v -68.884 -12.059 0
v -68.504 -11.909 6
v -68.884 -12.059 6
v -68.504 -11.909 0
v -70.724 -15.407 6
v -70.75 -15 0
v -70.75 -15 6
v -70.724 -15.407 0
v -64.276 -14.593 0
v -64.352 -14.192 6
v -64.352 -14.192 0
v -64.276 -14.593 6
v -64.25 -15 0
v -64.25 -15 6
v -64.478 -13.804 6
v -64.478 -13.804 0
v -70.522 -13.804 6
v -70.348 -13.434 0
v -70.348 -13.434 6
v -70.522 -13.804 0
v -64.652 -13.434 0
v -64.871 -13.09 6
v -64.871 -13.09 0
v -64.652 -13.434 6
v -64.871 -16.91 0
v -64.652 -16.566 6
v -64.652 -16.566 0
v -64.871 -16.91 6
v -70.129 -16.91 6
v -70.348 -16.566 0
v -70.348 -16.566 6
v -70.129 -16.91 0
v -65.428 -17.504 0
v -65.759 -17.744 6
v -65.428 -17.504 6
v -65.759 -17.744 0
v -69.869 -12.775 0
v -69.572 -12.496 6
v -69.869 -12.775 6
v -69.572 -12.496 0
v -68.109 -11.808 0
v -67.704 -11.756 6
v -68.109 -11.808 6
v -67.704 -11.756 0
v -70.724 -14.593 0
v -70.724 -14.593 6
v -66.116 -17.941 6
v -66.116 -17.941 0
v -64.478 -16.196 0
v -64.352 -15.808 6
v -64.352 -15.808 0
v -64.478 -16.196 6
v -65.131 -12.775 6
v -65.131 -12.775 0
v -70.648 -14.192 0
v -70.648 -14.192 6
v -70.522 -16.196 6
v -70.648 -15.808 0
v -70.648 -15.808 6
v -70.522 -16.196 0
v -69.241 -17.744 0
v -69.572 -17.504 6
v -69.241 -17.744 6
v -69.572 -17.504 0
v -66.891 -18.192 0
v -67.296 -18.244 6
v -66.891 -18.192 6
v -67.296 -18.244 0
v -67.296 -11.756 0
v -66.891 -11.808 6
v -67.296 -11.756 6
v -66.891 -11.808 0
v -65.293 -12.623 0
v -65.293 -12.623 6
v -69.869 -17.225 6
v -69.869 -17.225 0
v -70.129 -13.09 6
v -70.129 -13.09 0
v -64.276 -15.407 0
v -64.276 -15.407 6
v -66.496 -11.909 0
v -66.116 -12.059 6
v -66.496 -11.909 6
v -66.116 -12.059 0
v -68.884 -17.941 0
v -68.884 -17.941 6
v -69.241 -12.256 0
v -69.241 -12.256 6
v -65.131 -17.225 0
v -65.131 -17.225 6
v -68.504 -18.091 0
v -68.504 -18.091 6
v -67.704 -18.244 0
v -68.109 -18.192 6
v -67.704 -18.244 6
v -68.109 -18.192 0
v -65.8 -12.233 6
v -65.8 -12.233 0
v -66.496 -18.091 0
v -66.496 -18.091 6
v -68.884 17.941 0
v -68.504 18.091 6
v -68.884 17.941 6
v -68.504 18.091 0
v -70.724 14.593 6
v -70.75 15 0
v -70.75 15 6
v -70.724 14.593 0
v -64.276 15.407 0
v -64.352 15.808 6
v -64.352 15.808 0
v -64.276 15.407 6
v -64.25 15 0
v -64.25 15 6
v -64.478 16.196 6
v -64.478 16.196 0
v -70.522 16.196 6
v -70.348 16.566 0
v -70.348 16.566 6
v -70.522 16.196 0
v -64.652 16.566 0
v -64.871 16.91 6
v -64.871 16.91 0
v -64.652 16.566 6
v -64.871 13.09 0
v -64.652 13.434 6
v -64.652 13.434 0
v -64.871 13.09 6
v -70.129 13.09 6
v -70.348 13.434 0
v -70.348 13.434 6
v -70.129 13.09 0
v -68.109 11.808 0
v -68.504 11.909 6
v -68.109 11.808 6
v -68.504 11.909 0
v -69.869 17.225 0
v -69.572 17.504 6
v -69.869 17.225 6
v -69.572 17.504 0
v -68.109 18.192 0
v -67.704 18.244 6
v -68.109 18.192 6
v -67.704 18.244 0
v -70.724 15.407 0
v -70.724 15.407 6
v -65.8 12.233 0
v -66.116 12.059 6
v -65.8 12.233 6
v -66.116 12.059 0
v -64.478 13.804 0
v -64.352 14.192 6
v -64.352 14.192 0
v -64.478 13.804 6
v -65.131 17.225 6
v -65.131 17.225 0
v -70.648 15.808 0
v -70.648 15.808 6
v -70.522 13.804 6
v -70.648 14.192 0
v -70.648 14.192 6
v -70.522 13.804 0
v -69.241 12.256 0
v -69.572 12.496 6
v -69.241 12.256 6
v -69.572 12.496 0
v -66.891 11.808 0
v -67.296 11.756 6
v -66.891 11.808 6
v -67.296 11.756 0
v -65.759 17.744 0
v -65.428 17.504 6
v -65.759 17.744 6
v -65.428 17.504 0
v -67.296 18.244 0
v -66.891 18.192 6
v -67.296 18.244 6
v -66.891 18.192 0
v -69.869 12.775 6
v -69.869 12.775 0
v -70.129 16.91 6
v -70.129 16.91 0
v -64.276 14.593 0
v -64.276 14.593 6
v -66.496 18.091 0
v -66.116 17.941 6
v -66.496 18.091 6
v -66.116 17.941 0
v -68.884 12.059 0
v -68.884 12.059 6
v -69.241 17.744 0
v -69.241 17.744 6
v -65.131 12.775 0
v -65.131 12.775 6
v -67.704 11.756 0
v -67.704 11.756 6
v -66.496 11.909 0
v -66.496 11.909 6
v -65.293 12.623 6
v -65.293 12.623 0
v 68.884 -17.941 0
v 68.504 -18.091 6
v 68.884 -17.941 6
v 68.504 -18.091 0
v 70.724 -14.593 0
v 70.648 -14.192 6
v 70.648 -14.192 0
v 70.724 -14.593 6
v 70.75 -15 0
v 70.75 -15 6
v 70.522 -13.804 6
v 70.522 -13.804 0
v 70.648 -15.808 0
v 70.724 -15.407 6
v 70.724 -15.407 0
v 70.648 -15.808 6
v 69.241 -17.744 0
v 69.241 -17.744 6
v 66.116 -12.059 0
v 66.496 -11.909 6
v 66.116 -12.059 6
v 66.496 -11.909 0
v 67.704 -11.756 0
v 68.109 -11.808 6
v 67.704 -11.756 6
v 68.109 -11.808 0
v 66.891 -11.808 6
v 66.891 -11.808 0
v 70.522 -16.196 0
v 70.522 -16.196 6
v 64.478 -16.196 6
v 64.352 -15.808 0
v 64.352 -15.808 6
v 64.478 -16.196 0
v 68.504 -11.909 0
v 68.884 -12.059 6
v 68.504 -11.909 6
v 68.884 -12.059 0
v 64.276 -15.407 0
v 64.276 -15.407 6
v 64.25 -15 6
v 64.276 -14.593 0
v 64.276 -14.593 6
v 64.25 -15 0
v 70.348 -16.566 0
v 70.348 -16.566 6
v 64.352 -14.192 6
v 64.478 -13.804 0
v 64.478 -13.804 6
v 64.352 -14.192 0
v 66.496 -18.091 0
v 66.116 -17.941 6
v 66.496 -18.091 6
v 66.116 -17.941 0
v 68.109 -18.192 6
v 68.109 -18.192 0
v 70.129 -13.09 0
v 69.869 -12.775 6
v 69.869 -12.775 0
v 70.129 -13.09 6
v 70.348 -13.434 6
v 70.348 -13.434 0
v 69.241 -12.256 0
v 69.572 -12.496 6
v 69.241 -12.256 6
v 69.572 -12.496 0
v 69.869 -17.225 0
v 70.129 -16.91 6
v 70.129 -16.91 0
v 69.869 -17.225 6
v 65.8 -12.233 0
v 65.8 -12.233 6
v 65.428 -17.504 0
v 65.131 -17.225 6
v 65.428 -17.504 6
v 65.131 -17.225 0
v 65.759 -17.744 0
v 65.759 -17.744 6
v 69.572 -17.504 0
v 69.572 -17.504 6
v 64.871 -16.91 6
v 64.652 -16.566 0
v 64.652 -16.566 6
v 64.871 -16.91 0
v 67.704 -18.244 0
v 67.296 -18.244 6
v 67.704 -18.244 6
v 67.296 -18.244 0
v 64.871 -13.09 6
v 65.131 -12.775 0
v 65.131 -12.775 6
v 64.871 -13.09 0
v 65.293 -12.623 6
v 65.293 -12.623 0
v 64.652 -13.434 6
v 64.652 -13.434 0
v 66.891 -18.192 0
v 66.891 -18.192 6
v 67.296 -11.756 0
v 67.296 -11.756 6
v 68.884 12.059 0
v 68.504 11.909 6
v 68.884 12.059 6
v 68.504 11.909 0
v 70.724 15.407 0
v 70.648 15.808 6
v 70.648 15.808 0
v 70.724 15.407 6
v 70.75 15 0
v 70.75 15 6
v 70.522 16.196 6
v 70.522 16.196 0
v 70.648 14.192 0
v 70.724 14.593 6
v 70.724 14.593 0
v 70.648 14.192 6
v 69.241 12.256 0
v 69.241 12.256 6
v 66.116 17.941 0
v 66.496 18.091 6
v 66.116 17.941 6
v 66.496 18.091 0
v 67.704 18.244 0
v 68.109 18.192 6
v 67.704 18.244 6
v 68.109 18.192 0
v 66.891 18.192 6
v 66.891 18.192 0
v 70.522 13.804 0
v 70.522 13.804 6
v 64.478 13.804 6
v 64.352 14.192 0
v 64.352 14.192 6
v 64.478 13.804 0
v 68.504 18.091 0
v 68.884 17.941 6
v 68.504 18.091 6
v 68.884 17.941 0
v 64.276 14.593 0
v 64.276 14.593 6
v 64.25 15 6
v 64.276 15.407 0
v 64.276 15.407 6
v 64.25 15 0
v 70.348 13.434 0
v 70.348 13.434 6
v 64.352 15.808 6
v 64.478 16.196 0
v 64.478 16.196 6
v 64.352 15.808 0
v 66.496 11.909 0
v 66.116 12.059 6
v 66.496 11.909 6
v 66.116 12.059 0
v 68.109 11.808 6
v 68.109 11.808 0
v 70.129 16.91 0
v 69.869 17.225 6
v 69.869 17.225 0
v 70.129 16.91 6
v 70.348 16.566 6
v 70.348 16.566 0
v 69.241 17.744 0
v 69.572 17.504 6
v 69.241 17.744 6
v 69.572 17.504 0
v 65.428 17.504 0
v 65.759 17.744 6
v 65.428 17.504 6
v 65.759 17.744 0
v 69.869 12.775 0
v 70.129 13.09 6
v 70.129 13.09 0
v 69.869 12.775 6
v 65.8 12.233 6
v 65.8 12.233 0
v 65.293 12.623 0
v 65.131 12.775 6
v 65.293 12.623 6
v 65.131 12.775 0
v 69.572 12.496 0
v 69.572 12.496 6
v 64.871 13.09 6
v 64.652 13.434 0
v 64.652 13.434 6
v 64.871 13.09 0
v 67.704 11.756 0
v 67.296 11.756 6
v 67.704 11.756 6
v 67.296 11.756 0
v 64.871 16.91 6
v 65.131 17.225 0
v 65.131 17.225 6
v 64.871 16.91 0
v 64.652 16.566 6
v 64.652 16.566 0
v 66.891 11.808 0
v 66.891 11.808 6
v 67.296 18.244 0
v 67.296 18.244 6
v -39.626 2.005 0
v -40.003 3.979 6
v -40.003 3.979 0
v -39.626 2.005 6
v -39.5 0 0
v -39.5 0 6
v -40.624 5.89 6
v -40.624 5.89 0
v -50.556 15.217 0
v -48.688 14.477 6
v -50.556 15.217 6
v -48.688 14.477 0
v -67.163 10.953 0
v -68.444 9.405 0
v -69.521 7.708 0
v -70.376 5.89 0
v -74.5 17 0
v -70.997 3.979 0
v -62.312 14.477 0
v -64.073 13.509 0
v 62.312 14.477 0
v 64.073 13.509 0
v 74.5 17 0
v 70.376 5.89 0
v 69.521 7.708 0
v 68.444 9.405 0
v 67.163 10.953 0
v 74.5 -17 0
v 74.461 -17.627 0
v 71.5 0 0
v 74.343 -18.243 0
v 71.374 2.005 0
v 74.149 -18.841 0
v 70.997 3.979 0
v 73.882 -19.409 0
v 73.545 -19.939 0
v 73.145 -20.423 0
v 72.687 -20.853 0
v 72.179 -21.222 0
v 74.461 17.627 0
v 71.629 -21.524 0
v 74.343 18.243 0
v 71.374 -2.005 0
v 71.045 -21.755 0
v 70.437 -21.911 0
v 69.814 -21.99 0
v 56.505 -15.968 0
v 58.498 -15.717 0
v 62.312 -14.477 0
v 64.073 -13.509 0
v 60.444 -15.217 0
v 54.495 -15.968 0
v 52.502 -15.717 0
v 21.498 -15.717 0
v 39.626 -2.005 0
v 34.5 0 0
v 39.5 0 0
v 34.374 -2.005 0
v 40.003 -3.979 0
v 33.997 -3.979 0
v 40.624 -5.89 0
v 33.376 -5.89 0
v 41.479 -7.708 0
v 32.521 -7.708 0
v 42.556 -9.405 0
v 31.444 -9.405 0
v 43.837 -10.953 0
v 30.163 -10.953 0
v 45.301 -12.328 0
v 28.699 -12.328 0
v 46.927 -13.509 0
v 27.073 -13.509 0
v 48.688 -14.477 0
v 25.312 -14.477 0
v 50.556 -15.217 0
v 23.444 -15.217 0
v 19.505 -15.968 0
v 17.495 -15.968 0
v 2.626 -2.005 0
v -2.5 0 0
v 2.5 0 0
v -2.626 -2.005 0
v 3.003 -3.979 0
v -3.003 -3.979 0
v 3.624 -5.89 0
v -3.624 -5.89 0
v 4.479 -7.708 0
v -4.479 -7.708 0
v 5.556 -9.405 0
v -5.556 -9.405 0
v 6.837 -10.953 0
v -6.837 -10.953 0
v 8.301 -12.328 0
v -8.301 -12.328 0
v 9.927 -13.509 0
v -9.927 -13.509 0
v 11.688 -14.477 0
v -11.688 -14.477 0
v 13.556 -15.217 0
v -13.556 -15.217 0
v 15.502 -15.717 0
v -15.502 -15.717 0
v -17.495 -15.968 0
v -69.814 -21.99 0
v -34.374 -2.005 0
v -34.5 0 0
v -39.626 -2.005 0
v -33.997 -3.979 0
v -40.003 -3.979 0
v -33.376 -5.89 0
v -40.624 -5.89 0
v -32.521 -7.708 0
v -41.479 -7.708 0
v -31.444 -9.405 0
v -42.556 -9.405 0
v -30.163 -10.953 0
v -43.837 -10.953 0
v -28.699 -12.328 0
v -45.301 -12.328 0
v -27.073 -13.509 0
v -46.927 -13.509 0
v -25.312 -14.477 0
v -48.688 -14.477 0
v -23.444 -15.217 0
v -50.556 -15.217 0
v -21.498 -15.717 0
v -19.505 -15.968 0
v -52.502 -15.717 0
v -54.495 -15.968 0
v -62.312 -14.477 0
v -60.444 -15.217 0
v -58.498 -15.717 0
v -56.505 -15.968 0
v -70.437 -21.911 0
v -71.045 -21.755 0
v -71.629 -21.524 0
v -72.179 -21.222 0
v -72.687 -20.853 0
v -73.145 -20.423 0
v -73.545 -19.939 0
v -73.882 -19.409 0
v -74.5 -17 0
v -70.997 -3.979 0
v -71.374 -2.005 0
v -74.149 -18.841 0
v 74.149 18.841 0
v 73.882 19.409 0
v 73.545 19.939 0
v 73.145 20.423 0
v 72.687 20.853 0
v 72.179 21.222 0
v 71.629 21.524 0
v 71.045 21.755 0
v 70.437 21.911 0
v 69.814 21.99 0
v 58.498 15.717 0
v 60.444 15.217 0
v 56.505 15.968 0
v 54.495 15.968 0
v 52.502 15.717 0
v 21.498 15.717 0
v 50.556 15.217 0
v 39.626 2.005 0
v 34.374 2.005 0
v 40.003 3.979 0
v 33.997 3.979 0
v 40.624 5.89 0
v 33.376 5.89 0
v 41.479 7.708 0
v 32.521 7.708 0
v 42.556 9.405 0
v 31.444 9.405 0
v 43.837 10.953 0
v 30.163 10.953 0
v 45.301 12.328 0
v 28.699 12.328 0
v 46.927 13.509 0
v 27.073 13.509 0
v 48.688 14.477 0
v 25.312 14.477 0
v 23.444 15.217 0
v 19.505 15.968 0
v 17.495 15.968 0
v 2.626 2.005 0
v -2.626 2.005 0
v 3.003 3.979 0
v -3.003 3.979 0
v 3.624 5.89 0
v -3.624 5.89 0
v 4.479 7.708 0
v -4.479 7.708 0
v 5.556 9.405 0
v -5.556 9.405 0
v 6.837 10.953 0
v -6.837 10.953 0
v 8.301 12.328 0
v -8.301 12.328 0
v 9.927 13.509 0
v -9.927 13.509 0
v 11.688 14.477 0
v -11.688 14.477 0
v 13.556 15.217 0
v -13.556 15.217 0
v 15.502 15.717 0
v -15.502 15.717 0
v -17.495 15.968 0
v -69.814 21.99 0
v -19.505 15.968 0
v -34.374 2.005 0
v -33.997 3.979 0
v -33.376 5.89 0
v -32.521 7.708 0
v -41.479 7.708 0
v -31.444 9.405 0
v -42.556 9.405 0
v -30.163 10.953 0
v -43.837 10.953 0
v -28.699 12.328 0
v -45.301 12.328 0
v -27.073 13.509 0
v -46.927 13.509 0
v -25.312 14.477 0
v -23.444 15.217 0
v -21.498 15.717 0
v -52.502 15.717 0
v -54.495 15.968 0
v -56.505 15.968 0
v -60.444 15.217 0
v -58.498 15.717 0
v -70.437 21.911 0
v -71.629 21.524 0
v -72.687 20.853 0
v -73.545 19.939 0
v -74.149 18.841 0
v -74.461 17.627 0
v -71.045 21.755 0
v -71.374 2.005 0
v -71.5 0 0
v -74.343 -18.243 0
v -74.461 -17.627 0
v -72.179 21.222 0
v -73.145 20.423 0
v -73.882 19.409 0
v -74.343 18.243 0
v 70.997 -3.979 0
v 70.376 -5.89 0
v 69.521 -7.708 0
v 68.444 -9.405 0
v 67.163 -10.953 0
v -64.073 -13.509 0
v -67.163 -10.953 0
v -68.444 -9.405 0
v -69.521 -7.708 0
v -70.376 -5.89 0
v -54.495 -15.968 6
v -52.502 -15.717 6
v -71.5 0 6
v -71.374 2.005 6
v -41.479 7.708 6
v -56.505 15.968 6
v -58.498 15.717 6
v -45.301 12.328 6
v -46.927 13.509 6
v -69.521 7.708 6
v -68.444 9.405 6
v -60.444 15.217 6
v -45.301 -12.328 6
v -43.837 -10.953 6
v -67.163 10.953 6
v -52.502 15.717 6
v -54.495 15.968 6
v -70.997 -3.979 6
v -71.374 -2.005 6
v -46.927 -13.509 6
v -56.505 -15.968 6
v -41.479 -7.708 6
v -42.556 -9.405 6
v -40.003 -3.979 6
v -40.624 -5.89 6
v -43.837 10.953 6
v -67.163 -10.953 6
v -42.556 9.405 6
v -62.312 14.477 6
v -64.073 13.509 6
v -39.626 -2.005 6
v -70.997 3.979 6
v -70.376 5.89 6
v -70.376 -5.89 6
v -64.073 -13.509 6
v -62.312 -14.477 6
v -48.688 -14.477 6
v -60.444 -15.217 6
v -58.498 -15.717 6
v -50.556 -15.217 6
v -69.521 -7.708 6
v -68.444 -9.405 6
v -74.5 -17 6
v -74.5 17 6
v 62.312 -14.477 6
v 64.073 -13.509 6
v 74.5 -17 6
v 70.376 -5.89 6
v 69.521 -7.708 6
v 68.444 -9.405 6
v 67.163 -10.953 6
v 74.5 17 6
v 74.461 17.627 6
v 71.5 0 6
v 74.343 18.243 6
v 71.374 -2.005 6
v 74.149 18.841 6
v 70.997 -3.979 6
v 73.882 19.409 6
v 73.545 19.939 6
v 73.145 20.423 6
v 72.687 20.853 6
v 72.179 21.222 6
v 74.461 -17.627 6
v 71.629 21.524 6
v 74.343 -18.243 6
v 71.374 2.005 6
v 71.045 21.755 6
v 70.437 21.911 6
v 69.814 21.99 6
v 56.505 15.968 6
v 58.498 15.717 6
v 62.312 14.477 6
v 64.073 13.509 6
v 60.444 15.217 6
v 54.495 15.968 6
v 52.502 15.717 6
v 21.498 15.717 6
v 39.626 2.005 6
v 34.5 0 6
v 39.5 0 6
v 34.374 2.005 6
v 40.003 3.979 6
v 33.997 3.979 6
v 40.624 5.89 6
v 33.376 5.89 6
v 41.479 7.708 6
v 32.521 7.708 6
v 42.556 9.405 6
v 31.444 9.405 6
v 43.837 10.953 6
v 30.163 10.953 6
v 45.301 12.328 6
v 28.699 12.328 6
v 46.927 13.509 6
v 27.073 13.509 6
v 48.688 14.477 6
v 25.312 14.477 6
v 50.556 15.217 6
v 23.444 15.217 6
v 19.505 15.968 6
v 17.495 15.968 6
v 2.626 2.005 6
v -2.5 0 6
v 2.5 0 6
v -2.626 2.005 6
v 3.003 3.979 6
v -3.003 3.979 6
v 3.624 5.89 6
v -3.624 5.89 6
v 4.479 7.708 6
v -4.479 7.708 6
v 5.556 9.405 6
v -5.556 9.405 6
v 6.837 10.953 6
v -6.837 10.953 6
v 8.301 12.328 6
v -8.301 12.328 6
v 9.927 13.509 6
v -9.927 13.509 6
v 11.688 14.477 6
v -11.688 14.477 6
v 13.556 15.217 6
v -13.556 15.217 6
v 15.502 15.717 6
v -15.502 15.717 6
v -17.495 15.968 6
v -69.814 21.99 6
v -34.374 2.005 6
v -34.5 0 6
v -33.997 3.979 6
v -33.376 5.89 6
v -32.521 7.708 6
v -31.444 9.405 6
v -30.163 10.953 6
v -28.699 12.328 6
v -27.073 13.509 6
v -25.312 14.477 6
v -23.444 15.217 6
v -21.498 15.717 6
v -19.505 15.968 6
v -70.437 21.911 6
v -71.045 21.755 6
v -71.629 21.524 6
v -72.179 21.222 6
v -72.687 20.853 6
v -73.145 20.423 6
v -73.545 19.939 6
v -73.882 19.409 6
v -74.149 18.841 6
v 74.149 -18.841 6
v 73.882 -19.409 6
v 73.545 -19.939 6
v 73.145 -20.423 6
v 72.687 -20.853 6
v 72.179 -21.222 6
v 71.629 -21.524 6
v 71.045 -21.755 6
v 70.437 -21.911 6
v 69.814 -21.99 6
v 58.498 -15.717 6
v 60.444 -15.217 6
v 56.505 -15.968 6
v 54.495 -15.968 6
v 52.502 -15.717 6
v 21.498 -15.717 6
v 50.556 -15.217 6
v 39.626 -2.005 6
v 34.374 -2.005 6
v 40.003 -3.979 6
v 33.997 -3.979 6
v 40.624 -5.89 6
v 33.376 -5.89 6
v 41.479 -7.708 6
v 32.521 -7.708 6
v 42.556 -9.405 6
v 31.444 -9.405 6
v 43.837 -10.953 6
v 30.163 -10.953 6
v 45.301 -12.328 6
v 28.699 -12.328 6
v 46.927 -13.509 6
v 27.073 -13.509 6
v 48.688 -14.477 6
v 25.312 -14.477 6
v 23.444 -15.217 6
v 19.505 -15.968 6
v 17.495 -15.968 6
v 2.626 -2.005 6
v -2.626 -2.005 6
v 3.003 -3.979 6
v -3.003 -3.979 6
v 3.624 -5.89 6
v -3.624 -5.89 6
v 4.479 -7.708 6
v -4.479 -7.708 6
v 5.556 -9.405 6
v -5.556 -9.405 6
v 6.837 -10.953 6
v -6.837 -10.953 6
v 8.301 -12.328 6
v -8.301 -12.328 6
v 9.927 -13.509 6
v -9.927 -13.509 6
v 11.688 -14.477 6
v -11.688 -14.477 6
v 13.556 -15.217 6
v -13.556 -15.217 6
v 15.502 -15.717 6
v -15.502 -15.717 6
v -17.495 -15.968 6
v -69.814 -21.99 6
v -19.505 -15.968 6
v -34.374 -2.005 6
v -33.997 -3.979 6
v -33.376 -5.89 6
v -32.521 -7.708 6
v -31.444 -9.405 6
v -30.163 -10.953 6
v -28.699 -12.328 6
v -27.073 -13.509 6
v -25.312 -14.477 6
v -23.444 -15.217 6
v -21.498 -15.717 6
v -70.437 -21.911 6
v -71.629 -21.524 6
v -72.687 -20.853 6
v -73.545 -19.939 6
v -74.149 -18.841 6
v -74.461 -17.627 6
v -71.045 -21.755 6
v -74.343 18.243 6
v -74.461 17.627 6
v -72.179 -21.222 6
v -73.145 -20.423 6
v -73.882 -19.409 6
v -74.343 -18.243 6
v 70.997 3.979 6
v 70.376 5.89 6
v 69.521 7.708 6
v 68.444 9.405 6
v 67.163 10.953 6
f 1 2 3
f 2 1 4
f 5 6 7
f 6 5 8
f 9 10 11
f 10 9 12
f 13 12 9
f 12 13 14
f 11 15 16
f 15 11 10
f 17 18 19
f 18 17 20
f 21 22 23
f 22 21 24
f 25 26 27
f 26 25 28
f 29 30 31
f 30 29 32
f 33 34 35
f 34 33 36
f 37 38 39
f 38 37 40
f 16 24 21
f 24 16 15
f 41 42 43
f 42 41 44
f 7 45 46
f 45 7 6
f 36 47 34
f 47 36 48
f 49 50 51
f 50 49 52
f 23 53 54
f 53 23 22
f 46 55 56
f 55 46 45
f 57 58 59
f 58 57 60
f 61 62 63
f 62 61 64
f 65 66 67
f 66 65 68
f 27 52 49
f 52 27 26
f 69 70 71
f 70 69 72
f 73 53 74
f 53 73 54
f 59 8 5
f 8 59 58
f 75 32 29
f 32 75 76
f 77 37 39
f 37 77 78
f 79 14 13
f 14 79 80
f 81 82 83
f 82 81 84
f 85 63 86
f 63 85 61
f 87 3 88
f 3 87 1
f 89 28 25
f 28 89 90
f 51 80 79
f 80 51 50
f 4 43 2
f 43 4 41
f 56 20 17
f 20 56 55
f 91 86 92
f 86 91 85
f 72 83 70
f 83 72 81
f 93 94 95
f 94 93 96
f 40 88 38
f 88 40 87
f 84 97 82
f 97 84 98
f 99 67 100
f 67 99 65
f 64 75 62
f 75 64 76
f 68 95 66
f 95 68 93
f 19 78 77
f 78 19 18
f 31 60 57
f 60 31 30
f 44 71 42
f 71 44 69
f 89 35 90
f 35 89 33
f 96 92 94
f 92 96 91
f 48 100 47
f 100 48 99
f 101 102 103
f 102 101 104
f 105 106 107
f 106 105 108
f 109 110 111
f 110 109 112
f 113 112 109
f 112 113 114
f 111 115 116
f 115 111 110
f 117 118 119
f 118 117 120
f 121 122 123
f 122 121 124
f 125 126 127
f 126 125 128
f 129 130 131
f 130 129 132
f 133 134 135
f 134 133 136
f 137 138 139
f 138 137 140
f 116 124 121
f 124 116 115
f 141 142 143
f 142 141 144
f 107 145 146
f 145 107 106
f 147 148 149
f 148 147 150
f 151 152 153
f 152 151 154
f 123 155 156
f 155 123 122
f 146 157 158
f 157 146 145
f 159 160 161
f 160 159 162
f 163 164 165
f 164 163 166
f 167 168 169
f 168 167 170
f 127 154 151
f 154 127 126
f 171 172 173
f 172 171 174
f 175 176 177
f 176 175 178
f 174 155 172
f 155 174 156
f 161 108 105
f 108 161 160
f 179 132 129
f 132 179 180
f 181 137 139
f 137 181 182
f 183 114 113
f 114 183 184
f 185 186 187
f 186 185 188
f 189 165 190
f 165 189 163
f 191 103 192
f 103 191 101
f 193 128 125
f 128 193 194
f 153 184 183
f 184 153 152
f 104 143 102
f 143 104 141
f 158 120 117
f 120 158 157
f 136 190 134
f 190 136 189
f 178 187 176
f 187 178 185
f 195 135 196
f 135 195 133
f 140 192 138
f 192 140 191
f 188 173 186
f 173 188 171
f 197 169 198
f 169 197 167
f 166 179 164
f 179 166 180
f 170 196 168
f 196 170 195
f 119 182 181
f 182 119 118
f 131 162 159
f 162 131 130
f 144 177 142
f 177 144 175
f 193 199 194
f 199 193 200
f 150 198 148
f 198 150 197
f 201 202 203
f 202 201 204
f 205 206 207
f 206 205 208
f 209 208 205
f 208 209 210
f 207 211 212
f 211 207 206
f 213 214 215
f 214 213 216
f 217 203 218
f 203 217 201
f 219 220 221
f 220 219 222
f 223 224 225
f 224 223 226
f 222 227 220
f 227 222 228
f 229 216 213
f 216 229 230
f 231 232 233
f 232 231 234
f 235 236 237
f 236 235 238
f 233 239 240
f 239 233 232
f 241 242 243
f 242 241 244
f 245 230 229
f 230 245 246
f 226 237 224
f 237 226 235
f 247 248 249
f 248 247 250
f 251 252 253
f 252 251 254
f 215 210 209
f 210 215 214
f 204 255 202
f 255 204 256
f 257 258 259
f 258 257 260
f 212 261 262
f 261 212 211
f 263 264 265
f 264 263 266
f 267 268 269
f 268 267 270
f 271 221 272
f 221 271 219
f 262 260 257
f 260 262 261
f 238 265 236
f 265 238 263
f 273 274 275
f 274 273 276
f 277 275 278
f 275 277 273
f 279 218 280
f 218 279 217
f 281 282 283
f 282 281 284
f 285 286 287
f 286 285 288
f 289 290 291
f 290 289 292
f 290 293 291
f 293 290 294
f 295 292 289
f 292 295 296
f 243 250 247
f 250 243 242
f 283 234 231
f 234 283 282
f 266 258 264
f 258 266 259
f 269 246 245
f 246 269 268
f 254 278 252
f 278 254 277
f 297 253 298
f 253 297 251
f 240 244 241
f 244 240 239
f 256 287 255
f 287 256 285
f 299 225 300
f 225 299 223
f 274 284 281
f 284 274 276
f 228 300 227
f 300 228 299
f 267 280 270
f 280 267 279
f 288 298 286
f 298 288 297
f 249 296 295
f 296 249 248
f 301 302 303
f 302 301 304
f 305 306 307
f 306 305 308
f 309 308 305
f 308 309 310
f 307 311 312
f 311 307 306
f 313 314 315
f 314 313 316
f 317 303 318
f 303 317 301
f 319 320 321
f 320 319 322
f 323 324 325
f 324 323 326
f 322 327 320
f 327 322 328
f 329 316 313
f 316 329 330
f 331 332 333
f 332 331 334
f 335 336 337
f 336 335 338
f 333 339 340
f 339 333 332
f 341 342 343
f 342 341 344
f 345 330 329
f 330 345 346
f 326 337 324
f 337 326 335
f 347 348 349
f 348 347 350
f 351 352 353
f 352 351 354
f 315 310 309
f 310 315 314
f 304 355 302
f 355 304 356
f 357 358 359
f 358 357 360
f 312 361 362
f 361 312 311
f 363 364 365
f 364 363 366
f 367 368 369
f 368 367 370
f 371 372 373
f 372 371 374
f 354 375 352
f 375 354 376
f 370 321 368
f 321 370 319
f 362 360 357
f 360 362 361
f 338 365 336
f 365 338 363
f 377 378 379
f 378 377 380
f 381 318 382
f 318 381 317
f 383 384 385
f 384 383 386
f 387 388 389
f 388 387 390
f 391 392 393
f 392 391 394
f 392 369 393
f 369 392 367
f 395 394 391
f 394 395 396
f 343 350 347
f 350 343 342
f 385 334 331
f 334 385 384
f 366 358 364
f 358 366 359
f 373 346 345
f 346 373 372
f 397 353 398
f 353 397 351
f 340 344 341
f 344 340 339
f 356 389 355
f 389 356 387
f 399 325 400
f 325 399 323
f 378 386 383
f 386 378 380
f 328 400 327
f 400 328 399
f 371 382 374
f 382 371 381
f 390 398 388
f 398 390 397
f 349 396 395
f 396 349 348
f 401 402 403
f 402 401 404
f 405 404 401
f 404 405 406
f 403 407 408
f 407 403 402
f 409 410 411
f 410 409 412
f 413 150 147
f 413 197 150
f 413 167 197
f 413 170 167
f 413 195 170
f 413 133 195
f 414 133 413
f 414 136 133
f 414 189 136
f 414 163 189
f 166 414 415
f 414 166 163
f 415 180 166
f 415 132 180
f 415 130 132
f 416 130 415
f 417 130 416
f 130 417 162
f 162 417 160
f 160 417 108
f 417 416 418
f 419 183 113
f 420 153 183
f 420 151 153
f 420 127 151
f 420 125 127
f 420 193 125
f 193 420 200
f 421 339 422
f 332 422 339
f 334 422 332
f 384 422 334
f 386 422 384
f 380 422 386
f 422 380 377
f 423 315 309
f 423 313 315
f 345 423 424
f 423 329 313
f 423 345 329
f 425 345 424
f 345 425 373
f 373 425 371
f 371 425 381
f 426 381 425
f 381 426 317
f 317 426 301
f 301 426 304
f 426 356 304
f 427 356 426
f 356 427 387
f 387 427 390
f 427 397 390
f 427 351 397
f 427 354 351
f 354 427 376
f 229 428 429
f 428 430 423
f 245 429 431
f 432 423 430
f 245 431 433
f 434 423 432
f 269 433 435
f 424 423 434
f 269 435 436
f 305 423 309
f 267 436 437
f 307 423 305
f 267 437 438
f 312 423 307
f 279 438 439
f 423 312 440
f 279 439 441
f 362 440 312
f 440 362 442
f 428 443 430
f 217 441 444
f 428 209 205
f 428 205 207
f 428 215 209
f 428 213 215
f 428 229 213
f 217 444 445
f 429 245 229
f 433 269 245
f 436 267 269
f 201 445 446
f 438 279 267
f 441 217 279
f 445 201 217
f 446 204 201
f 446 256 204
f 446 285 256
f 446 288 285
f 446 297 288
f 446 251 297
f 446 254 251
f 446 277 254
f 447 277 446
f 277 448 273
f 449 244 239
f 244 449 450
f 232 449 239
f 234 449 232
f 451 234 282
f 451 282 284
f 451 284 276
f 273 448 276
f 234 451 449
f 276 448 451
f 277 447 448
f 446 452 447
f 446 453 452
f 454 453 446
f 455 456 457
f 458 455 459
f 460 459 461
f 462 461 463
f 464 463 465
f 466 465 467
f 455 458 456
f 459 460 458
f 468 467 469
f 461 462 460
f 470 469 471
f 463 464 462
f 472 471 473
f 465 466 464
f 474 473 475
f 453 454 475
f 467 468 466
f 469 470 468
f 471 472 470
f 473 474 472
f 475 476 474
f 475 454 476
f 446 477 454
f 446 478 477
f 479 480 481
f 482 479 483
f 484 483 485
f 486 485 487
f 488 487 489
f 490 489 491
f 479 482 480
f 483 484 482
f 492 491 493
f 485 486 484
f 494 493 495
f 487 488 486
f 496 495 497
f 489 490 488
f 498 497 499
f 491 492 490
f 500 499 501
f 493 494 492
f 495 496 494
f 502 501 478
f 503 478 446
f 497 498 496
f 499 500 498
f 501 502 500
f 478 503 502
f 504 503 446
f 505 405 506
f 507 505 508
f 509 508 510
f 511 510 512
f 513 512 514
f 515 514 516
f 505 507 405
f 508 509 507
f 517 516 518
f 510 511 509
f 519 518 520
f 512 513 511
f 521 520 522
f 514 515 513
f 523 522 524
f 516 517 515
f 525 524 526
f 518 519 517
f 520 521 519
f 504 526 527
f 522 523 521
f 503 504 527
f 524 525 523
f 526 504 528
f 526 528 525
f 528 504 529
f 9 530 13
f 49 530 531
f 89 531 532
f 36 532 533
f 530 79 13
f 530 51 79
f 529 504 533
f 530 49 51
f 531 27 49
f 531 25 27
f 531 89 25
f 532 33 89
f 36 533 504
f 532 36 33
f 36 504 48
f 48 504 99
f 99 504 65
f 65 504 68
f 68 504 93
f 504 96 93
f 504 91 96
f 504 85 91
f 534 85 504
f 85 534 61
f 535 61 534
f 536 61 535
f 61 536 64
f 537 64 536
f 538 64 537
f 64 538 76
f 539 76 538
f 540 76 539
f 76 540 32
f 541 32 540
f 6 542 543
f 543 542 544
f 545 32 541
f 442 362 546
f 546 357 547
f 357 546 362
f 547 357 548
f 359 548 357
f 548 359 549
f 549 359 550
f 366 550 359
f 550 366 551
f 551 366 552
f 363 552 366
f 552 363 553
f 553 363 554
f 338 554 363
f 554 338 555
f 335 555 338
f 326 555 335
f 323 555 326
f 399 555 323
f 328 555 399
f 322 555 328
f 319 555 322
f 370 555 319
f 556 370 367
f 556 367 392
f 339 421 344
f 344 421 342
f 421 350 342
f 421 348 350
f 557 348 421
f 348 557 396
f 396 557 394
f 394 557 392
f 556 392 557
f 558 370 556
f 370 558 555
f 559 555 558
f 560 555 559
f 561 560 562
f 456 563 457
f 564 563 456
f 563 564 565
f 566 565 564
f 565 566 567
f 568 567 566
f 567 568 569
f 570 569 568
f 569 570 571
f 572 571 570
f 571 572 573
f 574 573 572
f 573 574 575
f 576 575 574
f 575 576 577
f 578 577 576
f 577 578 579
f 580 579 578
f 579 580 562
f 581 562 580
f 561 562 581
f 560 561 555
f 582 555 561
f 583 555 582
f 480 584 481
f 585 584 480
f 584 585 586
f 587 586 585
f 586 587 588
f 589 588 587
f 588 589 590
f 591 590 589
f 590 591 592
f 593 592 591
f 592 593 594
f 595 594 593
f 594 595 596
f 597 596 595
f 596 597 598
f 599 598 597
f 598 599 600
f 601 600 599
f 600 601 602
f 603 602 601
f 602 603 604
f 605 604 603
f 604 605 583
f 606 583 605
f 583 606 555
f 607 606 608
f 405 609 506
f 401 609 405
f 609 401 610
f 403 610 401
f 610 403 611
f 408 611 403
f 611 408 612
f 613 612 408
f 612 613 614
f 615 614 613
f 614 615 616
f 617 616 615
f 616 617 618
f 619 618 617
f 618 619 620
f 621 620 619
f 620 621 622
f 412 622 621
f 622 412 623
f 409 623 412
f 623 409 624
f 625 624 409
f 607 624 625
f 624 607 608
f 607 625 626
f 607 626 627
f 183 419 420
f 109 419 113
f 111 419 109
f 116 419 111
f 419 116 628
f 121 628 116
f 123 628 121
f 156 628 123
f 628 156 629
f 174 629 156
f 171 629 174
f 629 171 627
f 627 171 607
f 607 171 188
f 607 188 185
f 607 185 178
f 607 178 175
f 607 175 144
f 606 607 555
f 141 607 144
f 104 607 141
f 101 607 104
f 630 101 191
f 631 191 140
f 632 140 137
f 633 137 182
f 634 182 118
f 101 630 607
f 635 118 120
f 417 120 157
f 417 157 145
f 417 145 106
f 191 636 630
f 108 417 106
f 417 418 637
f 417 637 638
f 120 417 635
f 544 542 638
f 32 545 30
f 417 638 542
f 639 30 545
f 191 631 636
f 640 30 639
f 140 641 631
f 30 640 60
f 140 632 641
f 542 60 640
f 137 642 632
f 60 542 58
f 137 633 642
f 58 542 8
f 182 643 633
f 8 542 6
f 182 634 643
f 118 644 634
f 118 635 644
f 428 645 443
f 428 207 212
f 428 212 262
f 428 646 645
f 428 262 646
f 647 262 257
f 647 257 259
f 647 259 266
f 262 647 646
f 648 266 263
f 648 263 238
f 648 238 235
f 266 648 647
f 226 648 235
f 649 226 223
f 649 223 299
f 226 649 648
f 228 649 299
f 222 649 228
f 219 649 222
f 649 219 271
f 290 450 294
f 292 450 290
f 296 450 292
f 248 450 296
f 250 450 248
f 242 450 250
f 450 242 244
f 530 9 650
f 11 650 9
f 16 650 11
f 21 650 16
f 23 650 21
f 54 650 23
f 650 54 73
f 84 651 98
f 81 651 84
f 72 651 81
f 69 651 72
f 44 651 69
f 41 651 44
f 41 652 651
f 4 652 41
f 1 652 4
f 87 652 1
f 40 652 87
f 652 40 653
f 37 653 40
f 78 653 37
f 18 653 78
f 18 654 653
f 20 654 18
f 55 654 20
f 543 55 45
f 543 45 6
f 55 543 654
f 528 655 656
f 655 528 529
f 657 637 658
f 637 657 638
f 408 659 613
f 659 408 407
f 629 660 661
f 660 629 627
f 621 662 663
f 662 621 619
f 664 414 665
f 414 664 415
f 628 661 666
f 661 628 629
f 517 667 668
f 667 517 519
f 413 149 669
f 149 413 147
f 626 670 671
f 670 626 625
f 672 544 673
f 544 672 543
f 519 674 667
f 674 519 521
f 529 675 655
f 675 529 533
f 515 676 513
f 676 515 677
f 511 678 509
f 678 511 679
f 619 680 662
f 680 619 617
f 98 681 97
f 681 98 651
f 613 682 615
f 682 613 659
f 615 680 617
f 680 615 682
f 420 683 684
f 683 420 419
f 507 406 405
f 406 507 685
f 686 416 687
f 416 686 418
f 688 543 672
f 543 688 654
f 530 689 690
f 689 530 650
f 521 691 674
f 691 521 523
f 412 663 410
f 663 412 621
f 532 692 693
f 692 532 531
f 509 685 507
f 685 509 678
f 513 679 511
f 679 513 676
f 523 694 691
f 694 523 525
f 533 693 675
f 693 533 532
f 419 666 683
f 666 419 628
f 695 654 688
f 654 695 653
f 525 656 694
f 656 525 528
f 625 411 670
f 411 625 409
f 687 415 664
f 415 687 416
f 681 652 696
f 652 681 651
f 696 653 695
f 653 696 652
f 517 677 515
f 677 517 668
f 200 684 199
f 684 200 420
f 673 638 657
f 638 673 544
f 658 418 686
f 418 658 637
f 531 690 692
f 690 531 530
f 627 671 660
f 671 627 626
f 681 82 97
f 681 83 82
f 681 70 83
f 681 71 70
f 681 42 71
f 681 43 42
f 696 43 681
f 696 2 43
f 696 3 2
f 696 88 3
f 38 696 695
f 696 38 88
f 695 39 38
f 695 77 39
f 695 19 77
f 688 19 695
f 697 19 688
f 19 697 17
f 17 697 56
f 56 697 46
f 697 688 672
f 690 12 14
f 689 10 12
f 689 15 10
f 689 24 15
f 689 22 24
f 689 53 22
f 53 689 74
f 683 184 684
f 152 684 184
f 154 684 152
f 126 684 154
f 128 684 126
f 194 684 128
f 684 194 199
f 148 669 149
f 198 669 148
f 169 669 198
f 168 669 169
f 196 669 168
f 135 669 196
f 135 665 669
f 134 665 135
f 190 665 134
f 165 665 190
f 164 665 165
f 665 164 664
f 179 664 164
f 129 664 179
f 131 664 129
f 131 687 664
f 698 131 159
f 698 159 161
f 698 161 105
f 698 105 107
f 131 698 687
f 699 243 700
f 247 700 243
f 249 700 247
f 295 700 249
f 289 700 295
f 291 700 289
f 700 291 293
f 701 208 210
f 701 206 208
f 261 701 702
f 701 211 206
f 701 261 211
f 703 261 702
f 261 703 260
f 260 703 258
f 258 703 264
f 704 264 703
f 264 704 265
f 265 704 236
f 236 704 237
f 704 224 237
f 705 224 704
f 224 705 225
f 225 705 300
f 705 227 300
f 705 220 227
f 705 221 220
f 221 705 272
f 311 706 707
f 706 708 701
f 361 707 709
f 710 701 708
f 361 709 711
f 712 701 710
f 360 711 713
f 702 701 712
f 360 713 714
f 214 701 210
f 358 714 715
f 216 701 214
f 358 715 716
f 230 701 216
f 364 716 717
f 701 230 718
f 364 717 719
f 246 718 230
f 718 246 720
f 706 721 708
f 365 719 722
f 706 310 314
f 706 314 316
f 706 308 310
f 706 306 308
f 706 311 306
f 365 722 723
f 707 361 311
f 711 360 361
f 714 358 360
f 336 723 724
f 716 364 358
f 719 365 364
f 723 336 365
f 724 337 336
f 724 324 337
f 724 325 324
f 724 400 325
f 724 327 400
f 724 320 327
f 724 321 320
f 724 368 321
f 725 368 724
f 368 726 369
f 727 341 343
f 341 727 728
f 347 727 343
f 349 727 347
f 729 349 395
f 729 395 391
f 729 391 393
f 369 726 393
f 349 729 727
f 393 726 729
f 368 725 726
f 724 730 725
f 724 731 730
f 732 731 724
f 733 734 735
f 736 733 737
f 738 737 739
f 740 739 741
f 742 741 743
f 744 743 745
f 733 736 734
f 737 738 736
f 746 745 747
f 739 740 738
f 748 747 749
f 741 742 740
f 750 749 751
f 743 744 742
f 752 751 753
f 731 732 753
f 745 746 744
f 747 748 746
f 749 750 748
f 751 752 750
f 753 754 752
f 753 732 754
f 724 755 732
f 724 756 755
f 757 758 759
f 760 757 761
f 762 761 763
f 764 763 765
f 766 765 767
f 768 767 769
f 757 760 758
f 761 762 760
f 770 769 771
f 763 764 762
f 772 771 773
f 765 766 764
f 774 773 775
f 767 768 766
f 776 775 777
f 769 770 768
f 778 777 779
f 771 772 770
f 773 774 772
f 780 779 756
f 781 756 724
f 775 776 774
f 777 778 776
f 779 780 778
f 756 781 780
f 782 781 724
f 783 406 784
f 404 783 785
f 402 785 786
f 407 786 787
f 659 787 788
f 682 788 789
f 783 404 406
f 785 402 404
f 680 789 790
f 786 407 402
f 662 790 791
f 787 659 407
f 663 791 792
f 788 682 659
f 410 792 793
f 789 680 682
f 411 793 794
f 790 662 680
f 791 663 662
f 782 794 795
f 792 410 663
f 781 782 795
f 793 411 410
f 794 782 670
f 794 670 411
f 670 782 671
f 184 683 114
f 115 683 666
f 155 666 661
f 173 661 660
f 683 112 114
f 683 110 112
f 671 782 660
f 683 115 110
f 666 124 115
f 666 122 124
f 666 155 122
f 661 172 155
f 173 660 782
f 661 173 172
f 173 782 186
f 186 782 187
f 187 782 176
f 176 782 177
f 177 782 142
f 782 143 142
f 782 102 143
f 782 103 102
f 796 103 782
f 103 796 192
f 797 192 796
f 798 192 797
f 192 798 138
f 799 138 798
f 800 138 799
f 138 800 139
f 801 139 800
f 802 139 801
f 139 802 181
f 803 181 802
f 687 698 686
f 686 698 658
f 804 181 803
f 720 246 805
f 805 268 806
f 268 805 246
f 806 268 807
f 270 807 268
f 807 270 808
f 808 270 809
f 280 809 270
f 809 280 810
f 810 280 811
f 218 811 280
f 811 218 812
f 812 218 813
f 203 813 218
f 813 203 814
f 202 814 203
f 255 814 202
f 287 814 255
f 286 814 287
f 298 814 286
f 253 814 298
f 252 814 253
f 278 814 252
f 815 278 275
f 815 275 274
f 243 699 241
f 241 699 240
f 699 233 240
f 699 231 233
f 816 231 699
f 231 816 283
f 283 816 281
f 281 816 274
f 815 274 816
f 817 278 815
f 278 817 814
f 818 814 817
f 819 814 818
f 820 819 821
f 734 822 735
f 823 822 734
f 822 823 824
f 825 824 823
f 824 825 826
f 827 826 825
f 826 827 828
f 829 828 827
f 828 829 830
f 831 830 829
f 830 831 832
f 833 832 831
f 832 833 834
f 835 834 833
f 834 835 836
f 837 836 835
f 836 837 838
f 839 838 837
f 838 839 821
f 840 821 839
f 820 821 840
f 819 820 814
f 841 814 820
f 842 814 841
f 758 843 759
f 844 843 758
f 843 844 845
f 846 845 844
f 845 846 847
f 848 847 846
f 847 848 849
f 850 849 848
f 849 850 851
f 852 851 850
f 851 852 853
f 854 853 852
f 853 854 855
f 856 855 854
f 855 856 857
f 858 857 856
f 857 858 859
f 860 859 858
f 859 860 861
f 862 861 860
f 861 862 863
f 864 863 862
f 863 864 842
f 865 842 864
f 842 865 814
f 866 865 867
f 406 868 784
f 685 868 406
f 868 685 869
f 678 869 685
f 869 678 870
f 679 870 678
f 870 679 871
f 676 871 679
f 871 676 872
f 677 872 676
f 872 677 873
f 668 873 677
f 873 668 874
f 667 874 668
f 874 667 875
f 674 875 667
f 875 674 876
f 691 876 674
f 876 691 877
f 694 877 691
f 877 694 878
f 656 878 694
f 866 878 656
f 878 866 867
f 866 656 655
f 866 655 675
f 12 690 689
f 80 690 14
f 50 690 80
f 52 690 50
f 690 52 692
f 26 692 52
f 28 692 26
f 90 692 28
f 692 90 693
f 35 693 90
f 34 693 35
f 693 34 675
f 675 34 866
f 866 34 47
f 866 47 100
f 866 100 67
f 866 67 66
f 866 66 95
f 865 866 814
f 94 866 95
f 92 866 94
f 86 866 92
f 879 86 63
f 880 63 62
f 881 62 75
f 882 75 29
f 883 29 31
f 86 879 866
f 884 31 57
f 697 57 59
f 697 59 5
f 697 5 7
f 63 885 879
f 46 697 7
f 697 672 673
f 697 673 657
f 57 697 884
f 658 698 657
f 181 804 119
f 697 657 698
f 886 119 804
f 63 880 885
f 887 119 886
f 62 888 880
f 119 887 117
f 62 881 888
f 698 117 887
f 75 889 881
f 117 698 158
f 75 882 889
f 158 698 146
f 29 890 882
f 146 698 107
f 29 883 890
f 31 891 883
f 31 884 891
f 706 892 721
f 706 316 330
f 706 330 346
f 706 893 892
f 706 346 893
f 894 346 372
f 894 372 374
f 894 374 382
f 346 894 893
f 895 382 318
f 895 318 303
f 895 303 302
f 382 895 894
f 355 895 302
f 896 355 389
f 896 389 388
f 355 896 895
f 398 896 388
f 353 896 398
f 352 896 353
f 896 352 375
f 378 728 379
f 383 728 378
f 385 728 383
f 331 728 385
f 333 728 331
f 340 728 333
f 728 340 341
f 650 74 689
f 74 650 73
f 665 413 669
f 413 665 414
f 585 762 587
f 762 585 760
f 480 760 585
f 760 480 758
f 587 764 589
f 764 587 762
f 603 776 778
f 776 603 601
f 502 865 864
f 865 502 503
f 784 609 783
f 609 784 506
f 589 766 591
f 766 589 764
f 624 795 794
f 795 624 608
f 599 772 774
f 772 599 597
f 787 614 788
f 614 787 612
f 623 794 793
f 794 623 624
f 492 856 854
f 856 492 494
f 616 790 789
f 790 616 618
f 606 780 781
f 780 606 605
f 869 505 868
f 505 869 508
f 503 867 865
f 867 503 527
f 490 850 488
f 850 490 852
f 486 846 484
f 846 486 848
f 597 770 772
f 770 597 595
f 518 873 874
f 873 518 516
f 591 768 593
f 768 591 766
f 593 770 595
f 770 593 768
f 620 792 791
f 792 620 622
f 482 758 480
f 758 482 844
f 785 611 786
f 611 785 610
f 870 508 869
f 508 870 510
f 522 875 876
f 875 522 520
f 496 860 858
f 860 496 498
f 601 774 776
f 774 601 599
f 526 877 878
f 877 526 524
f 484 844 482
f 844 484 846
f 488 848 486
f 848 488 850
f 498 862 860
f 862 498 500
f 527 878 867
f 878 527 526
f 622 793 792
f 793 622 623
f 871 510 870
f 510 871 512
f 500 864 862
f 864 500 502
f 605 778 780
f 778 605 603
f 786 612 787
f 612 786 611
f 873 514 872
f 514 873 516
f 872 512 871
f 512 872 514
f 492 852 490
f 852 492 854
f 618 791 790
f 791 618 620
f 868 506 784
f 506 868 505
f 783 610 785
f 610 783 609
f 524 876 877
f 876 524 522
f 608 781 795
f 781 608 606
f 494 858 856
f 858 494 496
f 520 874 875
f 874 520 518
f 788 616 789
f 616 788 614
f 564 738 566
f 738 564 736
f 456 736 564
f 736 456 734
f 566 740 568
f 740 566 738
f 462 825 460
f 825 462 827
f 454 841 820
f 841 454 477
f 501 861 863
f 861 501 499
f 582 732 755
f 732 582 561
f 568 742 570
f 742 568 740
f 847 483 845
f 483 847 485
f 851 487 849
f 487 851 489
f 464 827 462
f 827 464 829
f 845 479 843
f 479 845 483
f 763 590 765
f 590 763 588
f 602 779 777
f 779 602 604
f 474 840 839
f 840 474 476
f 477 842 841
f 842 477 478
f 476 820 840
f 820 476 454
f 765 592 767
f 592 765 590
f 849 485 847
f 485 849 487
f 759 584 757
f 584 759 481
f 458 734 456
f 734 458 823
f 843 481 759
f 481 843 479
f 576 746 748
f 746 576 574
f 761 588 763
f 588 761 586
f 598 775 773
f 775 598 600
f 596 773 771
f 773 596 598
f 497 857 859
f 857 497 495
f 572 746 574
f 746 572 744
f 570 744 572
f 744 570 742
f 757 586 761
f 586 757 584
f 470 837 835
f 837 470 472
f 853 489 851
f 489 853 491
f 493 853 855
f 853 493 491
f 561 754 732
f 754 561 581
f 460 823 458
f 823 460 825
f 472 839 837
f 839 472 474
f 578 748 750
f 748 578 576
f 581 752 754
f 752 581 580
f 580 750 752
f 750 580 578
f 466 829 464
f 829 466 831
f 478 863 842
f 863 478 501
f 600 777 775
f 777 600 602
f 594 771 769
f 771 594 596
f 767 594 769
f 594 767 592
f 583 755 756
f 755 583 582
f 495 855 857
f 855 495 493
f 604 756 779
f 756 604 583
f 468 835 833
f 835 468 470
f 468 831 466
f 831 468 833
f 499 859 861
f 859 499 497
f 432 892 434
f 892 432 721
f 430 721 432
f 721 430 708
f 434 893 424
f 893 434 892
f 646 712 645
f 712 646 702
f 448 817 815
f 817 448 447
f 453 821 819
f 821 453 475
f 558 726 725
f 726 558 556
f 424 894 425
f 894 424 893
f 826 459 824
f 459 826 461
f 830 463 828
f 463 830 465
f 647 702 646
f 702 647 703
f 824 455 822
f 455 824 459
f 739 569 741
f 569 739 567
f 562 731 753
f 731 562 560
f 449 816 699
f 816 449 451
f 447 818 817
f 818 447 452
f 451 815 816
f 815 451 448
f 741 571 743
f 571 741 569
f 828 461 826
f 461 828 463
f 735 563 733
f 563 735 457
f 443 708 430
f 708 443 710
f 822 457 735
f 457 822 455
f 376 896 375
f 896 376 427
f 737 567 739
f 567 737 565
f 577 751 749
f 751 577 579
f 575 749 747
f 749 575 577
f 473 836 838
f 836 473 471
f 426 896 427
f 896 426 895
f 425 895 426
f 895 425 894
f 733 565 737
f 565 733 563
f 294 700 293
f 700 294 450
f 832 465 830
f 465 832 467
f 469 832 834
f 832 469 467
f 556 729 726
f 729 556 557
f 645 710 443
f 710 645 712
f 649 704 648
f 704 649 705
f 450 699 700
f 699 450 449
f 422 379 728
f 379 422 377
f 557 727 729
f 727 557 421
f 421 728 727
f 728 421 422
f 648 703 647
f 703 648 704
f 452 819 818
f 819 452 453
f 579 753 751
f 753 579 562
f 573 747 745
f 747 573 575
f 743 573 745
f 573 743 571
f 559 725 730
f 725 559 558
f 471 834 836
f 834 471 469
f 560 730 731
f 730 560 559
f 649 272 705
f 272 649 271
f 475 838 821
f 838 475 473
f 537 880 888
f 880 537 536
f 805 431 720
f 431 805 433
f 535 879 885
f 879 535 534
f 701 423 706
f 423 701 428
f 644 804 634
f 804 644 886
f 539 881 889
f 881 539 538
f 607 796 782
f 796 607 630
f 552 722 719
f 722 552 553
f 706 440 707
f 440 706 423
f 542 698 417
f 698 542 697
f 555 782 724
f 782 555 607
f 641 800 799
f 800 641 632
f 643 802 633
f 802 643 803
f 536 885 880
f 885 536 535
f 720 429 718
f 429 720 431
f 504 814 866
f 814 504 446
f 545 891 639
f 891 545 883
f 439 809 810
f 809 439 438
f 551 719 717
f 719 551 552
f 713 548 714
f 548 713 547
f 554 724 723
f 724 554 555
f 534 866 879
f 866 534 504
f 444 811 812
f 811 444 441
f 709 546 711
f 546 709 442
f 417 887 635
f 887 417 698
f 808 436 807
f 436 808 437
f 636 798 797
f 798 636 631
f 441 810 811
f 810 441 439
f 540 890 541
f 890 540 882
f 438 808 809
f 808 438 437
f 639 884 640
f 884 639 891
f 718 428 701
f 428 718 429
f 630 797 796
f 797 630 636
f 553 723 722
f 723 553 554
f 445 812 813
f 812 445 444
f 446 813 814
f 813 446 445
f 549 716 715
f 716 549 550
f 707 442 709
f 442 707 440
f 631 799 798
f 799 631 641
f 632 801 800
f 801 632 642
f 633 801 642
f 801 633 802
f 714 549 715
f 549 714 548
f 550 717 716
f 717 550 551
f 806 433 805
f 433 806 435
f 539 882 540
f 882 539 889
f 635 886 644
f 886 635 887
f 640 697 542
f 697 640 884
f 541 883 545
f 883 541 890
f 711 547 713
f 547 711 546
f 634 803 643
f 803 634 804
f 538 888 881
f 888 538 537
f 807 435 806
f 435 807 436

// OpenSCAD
$fn = 50;


difference() {
	union() {
		hull() {
			translate(v = [-69.5000000000, 17.0000000000, 0]) {
				cylinder(h = 6, r = 5);
			}
			translate(v = [69.5000000000, 17.0000000000, 0]) {
				cylinder(h = 6, r = 5);
			}
			translate(v = [-69.5000000000, -17.0000000000, 0]) {
				cylinder(h = 6, r = 5);
			}
			translate(v = [69.5000000000, -17.0000000000, 0]) {
				cylinder(h = 6, r = 5);
			}
		}
	}
	union() {
		#translate(v = [-67.5000000000, -15.0000000000, -100.0000000000]) {
			cylinder(h = 200, r = 3.2500000000);
		}
		#translate(v = [-67.5000000000, 15.0000000000, -100.0000000000]) {
			cylinder(h = 200, r = 3.2500000000);
		}
		#translate(v = [67.5000000000, -15.0000000000, -100.0000000000]) {
			cylinder(h = 200, r = 3.2500000000);
		}
		#translate(v = [67.5000000000, 15.0000000000, -100.0000000000]) {
			cylinder(h = 200, r = 3.2500000000);
		}
		#translate(v = [-55.5000000000, 0, 0]) {
			cylinder(h = 6, r = 16.0000000000);
		}
		#translate(v = [-18.5000000000, 0, 0]) {
			cylinder(h = 6, r = 16.0000000000);
		}
		#translate(v = [18.5000000000, 0, 0]) {
			cylinder(h = 6, r = 16.0000000000);
		}
		#translate(v = [55.5000000000, 0, 0]) {
			cylinder(h = 6, r = 16.0000000000);
		}
	}
}
